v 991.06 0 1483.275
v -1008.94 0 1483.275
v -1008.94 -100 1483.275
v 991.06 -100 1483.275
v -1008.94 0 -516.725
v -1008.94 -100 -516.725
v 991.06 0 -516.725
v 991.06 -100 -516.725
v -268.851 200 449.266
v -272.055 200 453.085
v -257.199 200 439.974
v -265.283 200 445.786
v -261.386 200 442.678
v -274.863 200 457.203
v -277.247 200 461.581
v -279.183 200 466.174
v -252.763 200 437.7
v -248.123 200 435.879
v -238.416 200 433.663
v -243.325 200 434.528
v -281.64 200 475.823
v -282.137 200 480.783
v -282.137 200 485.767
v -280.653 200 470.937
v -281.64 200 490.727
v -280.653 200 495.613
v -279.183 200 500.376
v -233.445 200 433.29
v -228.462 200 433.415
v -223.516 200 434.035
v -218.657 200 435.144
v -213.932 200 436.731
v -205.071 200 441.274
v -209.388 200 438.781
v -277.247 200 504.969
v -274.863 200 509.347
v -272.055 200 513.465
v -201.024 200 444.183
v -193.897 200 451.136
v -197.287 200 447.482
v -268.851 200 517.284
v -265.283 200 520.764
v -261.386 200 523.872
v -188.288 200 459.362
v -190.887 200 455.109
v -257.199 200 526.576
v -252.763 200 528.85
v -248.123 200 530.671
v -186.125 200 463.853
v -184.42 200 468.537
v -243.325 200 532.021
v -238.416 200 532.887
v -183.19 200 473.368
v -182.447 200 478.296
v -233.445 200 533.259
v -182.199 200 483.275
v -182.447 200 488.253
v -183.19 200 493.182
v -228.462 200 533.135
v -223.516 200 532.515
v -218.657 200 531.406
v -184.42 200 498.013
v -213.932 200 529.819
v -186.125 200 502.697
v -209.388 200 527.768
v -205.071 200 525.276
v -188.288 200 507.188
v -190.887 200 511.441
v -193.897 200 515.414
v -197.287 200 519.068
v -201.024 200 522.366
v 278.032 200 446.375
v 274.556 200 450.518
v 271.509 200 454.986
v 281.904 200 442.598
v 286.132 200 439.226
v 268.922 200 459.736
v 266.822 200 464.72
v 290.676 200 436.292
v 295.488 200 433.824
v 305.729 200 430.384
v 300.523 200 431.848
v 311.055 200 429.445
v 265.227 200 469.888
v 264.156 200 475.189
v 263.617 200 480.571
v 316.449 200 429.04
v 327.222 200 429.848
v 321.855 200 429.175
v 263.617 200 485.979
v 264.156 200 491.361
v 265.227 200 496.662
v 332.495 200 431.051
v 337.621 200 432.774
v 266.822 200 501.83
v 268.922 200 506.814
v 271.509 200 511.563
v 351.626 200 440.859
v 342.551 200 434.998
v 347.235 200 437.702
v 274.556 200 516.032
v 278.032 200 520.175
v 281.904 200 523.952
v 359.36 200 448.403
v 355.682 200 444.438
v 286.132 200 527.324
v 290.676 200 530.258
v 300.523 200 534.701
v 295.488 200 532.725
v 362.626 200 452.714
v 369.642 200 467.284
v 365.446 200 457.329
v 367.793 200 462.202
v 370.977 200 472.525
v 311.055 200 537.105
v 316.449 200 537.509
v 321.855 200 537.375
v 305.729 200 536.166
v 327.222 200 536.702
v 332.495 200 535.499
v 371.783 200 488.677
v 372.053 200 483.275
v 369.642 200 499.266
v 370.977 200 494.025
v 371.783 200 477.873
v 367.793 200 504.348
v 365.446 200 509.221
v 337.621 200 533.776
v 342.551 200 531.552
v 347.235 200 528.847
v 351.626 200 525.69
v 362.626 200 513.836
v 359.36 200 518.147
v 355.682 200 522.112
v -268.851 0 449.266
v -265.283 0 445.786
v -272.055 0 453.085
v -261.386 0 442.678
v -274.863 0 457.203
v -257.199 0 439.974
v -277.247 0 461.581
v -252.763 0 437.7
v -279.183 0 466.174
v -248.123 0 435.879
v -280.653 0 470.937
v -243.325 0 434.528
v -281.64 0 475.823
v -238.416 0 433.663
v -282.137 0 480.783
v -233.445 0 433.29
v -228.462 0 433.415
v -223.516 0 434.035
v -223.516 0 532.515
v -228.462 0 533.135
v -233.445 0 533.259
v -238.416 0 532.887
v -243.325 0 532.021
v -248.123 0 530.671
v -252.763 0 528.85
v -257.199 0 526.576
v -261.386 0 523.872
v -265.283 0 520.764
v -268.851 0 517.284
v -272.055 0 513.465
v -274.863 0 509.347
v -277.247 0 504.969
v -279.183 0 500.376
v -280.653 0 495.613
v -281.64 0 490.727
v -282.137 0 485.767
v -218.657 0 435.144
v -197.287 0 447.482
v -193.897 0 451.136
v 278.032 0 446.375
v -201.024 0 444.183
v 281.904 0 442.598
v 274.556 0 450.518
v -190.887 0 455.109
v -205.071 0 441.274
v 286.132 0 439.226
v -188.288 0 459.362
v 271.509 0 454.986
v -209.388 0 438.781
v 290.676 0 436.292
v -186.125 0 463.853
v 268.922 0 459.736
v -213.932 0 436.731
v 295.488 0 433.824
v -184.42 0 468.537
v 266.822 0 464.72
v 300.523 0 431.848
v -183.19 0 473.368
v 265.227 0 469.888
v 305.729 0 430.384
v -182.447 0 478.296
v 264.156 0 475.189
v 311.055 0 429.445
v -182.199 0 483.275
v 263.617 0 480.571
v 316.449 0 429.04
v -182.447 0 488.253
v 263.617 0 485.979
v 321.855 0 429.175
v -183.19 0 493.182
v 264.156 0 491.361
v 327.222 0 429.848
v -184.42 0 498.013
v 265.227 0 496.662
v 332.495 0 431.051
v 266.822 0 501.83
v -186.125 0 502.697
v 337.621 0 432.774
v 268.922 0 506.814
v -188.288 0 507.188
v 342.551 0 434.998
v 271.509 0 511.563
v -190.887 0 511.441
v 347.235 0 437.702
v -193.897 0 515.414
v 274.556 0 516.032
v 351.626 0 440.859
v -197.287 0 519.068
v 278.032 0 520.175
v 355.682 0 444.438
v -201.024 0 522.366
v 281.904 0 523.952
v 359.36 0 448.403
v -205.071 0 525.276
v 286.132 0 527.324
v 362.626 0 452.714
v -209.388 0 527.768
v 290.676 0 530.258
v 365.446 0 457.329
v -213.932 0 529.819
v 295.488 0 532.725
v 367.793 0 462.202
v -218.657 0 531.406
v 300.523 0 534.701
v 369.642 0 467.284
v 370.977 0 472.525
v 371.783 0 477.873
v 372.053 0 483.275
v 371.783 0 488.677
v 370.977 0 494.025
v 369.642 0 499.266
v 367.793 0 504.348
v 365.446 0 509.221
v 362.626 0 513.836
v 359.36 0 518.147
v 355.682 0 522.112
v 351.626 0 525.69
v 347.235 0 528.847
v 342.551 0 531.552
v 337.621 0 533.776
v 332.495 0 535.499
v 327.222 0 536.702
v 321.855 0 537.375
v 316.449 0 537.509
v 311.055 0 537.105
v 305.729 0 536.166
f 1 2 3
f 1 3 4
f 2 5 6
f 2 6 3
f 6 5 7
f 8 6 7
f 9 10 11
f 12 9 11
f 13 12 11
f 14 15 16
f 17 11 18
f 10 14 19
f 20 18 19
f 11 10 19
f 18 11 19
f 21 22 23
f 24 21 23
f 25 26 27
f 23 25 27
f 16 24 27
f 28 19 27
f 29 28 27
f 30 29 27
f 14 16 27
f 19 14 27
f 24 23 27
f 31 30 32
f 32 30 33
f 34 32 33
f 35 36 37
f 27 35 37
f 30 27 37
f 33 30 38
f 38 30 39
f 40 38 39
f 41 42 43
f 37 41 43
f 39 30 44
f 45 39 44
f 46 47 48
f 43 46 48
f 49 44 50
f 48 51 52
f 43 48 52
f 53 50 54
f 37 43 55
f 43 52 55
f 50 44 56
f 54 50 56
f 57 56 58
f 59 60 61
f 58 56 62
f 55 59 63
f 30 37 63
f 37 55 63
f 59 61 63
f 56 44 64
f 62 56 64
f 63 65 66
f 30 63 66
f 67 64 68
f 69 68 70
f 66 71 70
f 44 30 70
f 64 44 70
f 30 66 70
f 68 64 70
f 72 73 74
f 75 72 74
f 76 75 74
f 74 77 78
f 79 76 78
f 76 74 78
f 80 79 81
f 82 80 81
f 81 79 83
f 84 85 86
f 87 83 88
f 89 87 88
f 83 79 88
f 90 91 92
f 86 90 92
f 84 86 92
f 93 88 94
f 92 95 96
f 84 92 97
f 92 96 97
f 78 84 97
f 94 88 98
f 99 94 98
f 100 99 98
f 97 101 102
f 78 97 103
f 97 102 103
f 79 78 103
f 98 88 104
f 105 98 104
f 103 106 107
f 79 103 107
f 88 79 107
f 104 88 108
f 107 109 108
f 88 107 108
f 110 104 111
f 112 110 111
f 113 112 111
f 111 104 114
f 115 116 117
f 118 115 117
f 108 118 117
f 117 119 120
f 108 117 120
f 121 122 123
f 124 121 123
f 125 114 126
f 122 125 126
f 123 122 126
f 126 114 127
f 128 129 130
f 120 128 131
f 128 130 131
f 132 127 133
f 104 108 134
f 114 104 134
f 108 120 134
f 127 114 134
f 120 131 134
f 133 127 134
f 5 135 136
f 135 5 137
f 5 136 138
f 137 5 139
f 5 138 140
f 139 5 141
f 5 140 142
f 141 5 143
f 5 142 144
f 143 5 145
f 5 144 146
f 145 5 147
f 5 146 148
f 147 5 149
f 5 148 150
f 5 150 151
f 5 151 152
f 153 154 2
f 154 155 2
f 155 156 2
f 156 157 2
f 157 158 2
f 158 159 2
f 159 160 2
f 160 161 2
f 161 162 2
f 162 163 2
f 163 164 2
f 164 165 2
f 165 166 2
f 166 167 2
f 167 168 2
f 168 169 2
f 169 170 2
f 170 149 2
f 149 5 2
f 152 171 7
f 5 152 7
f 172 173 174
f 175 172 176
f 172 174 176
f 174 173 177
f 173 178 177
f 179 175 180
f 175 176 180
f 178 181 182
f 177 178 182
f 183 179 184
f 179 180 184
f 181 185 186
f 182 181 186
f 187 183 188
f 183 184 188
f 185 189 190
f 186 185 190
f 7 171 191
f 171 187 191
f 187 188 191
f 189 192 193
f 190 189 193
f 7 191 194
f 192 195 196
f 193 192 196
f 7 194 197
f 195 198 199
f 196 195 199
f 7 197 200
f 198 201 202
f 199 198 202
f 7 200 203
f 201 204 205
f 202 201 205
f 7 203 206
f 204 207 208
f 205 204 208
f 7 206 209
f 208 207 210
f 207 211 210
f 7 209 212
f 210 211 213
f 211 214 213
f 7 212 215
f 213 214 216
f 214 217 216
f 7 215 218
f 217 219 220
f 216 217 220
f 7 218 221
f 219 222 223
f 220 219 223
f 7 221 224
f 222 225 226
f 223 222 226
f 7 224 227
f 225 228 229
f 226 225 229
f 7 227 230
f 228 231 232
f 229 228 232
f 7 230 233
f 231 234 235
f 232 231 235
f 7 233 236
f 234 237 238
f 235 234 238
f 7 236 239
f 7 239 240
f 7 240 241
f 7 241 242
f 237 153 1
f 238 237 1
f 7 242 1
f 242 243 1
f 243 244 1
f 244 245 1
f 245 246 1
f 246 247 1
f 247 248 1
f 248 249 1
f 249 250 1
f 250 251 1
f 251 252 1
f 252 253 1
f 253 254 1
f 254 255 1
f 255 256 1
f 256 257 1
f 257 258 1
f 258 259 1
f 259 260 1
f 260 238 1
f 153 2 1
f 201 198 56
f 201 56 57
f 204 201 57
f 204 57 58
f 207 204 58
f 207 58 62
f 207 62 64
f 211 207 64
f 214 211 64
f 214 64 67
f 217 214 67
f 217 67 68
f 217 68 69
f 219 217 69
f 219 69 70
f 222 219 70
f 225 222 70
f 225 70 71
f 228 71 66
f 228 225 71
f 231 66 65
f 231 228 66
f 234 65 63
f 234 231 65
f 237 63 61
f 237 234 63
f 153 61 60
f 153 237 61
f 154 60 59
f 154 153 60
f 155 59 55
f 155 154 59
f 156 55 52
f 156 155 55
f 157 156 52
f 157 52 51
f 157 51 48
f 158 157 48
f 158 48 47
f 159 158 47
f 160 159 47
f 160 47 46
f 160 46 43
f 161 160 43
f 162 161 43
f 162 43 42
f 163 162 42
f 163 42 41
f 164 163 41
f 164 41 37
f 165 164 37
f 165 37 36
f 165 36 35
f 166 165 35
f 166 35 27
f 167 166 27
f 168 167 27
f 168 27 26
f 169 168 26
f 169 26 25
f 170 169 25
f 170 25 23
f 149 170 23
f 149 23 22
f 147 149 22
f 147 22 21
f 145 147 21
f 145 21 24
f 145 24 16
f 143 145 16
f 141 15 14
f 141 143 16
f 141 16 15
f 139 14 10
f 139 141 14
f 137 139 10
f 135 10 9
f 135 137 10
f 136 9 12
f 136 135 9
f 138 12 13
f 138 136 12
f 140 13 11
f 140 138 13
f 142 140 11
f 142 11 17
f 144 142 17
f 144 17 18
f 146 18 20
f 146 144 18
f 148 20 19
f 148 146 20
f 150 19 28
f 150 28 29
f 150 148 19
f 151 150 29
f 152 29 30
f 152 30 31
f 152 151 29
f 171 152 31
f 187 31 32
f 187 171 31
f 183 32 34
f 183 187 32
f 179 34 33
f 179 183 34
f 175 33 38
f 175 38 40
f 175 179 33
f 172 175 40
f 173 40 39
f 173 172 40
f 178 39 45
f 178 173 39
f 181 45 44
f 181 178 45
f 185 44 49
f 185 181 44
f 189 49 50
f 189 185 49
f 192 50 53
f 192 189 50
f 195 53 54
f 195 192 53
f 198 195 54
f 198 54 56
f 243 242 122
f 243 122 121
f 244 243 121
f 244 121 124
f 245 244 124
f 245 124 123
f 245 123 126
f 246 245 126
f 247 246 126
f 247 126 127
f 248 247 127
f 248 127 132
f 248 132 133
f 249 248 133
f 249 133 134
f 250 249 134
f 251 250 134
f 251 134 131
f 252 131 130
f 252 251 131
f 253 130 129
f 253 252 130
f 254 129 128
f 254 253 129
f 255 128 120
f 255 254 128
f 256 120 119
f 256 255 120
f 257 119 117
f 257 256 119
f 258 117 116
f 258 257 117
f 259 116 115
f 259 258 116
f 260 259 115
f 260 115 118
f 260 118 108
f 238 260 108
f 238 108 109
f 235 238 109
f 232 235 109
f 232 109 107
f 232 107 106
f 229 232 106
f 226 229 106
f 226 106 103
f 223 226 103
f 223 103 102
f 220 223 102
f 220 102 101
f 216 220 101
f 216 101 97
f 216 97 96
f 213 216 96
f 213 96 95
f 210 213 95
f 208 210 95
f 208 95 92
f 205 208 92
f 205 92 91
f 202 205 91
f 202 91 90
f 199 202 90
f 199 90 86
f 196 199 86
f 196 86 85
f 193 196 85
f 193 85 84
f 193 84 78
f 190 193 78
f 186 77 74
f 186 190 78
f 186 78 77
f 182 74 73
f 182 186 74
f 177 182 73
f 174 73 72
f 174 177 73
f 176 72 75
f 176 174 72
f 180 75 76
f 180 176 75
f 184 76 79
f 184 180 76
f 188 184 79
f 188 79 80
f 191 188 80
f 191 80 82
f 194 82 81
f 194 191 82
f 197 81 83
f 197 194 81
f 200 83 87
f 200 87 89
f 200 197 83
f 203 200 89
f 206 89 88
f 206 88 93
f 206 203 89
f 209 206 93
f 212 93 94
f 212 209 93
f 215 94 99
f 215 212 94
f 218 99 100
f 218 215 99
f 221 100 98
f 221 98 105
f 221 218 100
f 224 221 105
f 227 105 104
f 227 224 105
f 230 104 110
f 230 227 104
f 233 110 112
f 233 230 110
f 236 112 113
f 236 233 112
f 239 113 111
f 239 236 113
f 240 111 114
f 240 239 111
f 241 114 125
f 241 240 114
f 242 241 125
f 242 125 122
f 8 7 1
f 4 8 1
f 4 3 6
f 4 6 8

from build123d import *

# Parameters (mm, degrees)
F0_W     = 2000
F0_H     = 2000
F1_DEPTH = 100
F2_R     = 50
F2_R_2   = 54.251407
F3_DEPTH = 300


with BuildPart() as f1:
    # F0 (on Front) → F1 (new body)
    with BuildSketch(Plane.XZ):
        with Locations((-8.939937, 483.27489)):
            Rectangle(F0_W, F0_H)
    extrude(amount=F1_DEPTH)

    # F2 (on face) → F3 (join)
    with BuildSketch(Plane.XZ.offset(100)):
        with Locations((-232.198777, 483.27489)):
            Circle(F2_R)
        with Locations((317.801223, 483.27489)):
            Circle(F2_R_2)
    extrude(amount=-F3_DEPTH)


solid = f1.part
